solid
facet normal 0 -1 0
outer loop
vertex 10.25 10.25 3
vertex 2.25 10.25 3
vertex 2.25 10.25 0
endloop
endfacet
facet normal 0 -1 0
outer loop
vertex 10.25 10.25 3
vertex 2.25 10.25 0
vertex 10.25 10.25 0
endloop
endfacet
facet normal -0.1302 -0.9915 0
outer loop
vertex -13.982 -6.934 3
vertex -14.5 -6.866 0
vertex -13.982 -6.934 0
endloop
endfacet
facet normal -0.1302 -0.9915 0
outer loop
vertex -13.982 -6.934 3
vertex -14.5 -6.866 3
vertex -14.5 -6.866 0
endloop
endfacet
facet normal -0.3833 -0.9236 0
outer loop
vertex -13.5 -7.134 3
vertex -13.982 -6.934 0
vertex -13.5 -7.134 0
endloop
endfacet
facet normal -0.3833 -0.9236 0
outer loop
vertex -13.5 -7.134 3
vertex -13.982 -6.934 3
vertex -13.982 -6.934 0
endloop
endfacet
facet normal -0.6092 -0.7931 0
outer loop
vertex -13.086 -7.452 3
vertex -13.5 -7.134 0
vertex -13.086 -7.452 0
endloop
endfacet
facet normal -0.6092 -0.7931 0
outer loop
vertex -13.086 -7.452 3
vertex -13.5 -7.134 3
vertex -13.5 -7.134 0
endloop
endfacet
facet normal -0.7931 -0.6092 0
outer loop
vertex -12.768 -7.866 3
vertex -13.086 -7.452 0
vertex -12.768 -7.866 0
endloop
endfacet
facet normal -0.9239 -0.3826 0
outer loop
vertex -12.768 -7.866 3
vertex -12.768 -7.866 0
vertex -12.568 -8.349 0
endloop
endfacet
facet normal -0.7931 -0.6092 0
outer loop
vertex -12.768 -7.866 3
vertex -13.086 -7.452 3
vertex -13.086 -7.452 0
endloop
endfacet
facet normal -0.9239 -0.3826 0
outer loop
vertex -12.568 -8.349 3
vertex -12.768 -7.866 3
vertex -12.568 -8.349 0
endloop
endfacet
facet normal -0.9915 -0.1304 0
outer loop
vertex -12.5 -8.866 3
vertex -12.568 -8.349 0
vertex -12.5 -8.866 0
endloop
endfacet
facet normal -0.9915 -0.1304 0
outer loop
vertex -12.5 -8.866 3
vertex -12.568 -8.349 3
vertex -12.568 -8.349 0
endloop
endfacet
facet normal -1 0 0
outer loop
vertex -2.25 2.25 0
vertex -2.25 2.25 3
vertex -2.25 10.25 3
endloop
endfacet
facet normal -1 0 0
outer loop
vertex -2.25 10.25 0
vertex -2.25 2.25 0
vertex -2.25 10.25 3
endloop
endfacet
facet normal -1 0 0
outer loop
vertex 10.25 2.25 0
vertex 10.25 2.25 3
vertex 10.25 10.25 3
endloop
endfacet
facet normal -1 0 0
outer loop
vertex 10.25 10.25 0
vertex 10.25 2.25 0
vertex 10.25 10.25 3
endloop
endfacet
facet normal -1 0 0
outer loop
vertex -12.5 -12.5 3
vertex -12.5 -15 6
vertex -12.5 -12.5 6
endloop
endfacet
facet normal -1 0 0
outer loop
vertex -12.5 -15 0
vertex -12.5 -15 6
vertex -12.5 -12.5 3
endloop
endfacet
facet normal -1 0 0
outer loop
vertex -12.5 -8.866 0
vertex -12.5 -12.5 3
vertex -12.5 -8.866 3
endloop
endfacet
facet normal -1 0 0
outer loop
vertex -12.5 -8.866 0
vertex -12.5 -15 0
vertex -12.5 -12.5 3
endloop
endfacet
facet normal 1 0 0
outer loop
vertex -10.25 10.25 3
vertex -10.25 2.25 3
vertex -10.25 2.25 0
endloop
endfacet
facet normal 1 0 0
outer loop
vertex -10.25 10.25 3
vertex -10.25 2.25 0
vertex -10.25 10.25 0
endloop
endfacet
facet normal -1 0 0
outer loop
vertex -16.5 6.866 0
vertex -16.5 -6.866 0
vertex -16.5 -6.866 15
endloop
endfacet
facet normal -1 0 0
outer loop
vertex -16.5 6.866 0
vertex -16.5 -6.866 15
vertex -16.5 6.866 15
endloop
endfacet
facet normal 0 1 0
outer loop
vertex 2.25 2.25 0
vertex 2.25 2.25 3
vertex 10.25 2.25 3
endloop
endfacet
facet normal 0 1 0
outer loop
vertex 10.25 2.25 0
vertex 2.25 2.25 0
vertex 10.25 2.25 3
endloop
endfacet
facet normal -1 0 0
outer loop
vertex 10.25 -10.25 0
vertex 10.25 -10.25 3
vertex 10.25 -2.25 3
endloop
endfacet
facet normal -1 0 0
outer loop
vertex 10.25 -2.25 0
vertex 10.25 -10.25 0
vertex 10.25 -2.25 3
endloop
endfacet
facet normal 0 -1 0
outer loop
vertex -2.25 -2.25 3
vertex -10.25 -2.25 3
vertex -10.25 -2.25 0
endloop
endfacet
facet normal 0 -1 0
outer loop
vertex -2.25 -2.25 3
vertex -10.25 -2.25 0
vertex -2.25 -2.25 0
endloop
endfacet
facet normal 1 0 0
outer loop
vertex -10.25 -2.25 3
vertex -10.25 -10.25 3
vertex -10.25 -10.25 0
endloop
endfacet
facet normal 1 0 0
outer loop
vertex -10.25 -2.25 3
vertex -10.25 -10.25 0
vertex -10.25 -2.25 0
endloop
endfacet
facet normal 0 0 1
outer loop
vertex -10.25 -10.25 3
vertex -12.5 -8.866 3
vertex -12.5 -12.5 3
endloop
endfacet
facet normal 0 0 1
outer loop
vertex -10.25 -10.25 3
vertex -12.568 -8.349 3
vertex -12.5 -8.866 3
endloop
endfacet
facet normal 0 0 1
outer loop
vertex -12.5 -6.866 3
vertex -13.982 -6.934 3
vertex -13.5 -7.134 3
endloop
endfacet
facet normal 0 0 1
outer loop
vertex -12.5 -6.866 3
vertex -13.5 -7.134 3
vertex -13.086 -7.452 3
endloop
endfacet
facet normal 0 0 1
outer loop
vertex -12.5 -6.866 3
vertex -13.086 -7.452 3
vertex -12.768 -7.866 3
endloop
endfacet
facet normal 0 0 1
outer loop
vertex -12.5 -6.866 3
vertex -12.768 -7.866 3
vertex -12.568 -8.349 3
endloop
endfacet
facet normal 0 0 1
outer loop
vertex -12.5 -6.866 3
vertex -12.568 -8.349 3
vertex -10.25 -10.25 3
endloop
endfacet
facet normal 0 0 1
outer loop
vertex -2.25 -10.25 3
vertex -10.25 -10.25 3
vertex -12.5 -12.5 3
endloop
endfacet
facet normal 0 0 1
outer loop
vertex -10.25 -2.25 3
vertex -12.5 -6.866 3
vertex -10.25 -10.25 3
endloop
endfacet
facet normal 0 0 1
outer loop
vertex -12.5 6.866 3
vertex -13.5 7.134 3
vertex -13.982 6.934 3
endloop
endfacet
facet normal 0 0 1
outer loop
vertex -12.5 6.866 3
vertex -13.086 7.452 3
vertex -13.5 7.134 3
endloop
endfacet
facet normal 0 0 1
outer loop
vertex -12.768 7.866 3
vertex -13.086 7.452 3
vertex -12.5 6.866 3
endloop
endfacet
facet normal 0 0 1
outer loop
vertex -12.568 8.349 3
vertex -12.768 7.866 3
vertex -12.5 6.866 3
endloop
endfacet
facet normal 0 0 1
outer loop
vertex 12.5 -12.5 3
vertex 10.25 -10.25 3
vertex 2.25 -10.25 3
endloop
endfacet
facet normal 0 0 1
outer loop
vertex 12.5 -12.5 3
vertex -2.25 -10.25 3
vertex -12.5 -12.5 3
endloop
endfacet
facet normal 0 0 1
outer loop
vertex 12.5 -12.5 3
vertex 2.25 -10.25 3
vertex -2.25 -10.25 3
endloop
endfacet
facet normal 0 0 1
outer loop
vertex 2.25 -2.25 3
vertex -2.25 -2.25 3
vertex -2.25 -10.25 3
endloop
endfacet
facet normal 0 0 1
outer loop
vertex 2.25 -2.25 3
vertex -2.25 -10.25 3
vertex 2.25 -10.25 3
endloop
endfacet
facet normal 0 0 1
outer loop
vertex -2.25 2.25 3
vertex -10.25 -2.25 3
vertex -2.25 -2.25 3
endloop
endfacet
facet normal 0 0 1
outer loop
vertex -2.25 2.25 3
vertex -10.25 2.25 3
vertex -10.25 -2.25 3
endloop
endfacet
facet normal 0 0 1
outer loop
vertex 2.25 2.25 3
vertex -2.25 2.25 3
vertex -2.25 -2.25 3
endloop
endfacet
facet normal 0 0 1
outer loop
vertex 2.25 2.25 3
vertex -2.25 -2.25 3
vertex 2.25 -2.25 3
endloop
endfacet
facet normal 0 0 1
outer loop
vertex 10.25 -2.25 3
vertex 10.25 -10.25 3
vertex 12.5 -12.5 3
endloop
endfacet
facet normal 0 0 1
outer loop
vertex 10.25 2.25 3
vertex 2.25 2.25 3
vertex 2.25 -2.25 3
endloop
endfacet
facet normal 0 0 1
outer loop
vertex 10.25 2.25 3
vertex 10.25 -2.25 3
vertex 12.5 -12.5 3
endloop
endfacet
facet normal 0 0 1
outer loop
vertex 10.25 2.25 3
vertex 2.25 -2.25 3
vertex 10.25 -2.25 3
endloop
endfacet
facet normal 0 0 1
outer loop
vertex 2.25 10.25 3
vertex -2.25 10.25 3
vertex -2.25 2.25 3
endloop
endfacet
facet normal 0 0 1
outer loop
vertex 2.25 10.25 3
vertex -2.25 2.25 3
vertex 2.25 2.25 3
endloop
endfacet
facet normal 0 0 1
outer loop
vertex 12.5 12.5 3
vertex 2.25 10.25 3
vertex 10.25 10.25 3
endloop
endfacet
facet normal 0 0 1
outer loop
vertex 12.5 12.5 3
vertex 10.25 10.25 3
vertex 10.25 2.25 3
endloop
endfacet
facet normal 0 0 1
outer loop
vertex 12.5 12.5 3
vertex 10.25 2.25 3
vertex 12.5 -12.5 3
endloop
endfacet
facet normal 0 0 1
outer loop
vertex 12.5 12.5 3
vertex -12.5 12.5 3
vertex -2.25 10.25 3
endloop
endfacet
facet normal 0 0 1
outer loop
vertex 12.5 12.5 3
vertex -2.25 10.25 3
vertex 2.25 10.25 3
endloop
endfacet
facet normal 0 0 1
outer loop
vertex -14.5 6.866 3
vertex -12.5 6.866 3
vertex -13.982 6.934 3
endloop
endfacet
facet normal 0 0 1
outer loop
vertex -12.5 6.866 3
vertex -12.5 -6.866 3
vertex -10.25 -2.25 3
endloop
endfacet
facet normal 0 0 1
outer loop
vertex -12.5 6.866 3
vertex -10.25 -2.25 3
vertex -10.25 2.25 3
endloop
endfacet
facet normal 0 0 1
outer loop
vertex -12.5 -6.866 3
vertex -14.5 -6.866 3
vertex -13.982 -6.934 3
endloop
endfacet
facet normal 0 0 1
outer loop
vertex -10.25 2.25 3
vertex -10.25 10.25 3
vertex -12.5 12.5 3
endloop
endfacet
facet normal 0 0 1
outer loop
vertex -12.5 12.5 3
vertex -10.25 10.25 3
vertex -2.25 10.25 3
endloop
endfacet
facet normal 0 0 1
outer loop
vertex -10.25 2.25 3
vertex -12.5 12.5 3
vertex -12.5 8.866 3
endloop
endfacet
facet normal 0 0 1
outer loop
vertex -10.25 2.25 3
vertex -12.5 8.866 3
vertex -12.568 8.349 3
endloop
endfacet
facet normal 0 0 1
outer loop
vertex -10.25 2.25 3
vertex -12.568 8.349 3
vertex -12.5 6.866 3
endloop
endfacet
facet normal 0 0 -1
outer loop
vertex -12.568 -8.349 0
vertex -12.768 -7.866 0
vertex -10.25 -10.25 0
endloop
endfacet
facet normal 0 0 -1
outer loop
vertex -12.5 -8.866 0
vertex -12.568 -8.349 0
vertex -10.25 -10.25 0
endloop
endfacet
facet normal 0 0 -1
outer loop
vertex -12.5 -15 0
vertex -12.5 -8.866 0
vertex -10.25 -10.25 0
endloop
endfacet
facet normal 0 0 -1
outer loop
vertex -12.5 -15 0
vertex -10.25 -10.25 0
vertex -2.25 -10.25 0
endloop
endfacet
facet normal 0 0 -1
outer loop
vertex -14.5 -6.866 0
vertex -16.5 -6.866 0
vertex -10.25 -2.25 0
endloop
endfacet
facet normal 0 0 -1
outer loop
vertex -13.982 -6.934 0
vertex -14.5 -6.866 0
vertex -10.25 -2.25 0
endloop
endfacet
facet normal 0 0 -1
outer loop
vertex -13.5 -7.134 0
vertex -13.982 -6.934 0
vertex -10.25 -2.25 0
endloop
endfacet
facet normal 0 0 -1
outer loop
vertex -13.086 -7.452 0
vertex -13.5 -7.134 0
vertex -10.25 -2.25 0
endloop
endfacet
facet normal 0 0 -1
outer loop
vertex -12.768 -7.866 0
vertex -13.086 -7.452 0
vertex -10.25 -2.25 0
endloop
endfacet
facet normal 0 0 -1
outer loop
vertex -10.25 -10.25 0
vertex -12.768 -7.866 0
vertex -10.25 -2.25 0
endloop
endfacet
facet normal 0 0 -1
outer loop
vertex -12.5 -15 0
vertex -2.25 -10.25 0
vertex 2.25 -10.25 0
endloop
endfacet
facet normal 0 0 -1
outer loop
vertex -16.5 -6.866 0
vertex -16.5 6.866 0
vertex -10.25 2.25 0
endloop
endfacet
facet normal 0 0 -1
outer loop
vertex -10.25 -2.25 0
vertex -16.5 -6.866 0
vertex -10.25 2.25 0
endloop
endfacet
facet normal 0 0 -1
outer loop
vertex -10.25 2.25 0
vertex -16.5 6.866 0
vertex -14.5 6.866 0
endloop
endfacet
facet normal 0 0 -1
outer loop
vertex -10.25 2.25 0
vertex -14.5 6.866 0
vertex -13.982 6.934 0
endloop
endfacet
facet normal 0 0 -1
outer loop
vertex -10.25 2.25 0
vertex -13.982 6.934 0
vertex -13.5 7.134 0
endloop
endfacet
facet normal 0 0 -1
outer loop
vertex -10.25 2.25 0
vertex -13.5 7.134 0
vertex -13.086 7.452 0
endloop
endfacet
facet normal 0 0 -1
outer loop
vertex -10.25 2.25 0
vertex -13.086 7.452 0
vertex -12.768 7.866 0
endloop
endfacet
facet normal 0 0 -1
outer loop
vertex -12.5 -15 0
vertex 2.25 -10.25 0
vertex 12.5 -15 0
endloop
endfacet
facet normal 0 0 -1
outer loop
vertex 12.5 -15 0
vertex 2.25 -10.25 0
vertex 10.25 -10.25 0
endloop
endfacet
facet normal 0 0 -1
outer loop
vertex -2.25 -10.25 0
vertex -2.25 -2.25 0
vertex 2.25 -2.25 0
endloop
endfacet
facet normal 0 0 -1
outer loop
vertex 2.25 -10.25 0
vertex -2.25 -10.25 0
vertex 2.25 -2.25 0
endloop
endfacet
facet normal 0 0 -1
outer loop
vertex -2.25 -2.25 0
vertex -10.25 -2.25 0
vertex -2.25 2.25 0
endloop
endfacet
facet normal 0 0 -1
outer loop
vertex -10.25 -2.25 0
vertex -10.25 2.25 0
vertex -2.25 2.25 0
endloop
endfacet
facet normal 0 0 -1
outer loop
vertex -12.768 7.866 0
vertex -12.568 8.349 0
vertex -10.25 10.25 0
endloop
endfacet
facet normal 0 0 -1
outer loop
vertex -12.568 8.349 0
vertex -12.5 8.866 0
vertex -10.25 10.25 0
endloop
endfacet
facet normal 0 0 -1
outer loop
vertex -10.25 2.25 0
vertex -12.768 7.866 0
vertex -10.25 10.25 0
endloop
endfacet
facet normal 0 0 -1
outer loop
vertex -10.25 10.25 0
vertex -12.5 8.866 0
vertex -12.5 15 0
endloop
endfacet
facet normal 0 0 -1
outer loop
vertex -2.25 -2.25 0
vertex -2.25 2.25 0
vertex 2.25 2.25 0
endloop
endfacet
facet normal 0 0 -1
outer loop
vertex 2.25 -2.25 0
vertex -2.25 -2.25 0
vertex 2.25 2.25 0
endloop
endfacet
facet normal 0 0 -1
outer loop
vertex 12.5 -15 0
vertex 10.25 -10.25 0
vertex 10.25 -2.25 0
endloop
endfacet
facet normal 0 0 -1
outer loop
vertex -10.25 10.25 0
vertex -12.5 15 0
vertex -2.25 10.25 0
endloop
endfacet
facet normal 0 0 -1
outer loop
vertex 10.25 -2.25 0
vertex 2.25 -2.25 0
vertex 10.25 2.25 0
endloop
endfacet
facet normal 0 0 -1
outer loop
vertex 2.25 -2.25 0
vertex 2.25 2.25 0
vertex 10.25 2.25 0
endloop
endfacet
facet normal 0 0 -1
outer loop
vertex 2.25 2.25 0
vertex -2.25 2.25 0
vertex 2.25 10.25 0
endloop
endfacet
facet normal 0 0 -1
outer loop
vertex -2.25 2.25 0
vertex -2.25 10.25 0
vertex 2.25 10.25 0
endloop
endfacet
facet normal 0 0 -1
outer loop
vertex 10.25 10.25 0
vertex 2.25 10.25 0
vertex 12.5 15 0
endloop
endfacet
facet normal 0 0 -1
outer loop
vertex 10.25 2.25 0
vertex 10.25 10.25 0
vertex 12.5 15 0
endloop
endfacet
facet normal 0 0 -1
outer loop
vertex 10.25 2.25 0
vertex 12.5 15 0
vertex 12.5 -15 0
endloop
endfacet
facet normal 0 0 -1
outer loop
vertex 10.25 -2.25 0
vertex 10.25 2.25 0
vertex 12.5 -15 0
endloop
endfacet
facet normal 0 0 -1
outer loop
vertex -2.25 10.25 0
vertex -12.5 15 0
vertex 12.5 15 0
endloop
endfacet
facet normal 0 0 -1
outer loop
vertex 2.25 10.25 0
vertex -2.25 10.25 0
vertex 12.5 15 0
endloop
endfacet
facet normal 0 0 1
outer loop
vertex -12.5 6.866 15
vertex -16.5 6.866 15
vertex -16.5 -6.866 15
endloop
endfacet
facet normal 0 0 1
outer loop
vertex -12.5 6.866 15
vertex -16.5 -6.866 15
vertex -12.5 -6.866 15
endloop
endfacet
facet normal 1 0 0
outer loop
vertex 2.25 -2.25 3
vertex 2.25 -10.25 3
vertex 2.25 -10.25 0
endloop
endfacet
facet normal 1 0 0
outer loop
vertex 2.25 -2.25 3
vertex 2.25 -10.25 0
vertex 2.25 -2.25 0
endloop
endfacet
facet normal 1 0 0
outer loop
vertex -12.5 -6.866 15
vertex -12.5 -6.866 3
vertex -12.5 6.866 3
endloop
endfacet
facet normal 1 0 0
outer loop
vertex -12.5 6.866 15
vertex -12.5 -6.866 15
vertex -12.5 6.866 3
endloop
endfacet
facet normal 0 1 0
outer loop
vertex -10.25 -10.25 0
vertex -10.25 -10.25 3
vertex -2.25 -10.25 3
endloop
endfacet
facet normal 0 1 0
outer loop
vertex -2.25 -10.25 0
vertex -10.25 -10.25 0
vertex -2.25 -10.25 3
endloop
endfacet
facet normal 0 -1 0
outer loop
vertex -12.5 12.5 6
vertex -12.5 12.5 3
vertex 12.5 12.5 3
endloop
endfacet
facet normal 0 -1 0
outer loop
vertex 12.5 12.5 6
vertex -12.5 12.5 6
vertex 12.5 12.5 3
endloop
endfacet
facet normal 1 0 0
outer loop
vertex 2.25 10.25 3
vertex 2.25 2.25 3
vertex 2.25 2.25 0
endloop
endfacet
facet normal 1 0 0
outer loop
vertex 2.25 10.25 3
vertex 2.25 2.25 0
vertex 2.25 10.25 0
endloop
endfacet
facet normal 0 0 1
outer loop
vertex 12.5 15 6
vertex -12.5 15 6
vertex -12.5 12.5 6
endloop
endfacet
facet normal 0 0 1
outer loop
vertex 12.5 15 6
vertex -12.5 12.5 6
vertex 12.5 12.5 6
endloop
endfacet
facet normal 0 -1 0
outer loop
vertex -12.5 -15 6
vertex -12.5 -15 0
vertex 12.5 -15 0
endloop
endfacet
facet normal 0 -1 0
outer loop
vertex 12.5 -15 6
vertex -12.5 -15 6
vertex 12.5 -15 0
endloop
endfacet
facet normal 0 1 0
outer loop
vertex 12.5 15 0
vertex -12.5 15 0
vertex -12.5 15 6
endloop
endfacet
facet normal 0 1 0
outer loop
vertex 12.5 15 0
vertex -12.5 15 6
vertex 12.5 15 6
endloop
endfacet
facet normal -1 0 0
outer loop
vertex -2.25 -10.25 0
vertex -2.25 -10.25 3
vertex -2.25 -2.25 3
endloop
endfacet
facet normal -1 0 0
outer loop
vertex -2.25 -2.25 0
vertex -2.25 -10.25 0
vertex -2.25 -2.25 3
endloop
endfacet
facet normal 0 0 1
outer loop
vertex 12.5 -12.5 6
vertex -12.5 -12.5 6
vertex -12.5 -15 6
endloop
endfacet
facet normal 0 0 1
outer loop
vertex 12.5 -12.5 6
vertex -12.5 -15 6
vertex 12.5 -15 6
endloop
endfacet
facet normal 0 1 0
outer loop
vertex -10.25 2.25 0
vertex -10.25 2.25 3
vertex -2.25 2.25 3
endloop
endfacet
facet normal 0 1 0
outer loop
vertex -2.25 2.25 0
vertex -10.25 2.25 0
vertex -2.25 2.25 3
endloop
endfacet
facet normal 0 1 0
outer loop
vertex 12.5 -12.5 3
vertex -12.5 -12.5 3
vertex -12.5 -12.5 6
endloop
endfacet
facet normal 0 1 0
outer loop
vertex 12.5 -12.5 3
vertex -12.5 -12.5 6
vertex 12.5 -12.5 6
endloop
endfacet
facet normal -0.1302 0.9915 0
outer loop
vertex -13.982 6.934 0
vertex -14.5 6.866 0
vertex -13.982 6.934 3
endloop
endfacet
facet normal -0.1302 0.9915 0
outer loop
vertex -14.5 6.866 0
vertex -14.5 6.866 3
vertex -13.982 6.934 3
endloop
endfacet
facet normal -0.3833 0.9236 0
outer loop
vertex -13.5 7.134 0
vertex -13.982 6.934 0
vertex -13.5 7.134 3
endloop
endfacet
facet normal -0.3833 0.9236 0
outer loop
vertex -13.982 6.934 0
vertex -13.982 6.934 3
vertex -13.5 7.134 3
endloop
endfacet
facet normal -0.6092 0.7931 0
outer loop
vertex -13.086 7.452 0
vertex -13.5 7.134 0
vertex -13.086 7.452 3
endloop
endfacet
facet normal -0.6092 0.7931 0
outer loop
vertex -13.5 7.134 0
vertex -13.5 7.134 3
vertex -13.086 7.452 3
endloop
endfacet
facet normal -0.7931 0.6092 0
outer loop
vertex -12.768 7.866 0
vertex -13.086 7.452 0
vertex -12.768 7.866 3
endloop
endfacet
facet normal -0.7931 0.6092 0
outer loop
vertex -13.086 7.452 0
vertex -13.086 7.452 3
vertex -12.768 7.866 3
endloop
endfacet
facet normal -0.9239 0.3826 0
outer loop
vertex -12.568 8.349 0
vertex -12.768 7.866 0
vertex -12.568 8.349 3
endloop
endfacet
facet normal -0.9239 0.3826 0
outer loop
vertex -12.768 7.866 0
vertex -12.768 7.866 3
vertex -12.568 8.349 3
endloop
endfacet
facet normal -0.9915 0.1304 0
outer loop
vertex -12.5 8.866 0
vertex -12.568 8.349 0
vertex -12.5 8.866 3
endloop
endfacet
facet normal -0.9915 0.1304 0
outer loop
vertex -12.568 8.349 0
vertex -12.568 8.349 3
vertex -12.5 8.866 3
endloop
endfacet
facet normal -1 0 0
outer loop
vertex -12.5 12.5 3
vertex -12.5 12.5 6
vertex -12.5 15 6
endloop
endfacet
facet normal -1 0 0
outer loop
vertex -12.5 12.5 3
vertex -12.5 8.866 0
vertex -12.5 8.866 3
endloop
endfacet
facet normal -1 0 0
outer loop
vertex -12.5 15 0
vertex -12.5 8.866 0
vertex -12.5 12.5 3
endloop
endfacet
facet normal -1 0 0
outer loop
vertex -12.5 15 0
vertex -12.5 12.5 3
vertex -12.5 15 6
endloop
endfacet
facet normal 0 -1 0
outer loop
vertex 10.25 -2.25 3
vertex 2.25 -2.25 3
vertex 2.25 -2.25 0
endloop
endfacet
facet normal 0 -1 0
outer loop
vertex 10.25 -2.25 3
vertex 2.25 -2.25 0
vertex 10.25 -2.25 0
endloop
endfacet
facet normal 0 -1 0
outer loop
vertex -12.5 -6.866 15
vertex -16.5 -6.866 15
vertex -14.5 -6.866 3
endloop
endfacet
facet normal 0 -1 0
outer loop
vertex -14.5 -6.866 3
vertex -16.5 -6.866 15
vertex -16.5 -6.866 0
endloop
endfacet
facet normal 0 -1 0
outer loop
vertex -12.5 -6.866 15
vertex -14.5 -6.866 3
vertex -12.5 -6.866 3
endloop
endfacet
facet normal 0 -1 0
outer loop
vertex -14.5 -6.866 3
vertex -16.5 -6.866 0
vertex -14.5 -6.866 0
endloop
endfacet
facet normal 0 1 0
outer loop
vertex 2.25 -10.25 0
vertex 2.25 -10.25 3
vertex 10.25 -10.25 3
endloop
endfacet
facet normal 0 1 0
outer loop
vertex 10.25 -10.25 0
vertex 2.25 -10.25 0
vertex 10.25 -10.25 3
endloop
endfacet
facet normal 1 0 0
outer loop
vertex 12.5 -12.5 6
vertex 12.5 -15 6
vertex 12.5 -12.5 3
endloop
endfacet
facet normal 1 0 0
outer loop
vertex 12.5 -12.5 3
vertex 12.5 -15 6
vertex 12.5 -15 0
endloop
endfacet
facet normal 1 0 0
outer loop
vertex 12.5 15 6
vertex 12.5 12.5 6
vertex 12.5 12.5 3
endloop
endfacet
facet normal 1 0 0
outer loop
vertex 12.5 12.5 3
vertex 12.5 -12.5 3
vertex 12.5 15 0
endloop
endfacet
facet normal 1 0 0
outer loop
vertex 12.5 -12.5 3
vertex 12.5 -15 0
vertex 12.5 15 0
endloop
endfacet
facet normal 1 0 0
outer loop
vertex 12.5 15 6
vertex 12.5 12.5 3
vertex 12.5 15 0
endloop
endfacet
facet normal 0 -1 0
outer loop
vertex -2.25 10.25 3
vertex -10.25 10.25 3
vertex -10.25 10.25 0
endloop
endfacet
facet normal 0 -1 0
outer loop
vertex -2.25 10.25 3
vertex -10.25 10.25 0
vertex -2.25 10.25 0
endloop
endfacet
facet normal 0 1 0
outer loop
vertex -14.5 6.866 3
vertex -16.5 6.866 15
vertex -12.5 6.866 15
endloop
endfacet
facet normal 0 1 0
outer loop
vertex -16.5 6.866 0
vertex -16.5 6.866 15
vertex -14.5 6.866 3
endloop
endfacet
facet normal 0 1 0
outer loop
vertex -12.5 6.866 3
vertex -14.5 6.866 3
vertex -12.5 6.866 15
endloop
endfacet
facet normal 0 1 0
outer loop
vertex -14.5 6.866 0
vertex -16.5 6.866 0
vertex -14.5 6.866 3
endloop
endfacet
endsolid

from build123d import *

# Parameters (mm, degrees)
F0_W     = 25
F0_H     = 30
F1_DEPTH = 3
F2_W     = 25
F2_H     = 2.5
F3_DEPTH = 3
F4_W     = 4
F4_H     = 13.7322908992
F5_DEPTH = 15
F6_R     = 2
F7_W     = 8
F7_H     = 8
F8_DEPTH = 3


with BuildPart() as f1:
    # F0 (on Top) → F1 (new body)
    with BuildSketch(Plane.XY):
        Rectangle(F0_W, F0_H)
    extrude(amount=F1_DEPTH)

    # F2 (on face) → F3 (join)
    with BuildSketch(Plane.XY.offset(3)):
        with Locations((0, 13.75)):
            Rectangle(F2_W, F2_H)
        with Locations((0, -13.75)):
            Rectangle(F2_W, F2_H)
    extrude(amount=F3_DEPTH)

    # F4 (on Top) → F5 (join)
    with BuildSketch(Plane.XY):
        with Locations((-14.5, 0)):
            Rectangle(F4_W, F4_H)
    extrude(amount=F5_DEPTH)

    # F6
    f6_edges = [f1.edges().sort_by_distance(p)[0] for p in [
        (-12.5, -6.866145, 1.5),
        (-12.5, 6.866145, 1.5),
    ]]
    fillet(f6_edges, radius=F6_R)

    # F7 (on face) → F8 (cut)
    with BuildSketch(Plane.XY.offset(3)):
        with Locations((-6.25, 6.25)):
            Rectangle(F7_W, F7_H)
        with Locations((6.25, 6.25)):
            Rectangle(F7_W, F7_H)
        with Locations((-6.25, -6.25)):
            Rectangle(F7_W, F7_H)
        with Locations((6.25, -6.25)):
            Rectangle(F7_W, F7_H)
    extrude(amount=-F8_DEPTH, mode=Mode.SUBTRACT)


solid = f1.part
